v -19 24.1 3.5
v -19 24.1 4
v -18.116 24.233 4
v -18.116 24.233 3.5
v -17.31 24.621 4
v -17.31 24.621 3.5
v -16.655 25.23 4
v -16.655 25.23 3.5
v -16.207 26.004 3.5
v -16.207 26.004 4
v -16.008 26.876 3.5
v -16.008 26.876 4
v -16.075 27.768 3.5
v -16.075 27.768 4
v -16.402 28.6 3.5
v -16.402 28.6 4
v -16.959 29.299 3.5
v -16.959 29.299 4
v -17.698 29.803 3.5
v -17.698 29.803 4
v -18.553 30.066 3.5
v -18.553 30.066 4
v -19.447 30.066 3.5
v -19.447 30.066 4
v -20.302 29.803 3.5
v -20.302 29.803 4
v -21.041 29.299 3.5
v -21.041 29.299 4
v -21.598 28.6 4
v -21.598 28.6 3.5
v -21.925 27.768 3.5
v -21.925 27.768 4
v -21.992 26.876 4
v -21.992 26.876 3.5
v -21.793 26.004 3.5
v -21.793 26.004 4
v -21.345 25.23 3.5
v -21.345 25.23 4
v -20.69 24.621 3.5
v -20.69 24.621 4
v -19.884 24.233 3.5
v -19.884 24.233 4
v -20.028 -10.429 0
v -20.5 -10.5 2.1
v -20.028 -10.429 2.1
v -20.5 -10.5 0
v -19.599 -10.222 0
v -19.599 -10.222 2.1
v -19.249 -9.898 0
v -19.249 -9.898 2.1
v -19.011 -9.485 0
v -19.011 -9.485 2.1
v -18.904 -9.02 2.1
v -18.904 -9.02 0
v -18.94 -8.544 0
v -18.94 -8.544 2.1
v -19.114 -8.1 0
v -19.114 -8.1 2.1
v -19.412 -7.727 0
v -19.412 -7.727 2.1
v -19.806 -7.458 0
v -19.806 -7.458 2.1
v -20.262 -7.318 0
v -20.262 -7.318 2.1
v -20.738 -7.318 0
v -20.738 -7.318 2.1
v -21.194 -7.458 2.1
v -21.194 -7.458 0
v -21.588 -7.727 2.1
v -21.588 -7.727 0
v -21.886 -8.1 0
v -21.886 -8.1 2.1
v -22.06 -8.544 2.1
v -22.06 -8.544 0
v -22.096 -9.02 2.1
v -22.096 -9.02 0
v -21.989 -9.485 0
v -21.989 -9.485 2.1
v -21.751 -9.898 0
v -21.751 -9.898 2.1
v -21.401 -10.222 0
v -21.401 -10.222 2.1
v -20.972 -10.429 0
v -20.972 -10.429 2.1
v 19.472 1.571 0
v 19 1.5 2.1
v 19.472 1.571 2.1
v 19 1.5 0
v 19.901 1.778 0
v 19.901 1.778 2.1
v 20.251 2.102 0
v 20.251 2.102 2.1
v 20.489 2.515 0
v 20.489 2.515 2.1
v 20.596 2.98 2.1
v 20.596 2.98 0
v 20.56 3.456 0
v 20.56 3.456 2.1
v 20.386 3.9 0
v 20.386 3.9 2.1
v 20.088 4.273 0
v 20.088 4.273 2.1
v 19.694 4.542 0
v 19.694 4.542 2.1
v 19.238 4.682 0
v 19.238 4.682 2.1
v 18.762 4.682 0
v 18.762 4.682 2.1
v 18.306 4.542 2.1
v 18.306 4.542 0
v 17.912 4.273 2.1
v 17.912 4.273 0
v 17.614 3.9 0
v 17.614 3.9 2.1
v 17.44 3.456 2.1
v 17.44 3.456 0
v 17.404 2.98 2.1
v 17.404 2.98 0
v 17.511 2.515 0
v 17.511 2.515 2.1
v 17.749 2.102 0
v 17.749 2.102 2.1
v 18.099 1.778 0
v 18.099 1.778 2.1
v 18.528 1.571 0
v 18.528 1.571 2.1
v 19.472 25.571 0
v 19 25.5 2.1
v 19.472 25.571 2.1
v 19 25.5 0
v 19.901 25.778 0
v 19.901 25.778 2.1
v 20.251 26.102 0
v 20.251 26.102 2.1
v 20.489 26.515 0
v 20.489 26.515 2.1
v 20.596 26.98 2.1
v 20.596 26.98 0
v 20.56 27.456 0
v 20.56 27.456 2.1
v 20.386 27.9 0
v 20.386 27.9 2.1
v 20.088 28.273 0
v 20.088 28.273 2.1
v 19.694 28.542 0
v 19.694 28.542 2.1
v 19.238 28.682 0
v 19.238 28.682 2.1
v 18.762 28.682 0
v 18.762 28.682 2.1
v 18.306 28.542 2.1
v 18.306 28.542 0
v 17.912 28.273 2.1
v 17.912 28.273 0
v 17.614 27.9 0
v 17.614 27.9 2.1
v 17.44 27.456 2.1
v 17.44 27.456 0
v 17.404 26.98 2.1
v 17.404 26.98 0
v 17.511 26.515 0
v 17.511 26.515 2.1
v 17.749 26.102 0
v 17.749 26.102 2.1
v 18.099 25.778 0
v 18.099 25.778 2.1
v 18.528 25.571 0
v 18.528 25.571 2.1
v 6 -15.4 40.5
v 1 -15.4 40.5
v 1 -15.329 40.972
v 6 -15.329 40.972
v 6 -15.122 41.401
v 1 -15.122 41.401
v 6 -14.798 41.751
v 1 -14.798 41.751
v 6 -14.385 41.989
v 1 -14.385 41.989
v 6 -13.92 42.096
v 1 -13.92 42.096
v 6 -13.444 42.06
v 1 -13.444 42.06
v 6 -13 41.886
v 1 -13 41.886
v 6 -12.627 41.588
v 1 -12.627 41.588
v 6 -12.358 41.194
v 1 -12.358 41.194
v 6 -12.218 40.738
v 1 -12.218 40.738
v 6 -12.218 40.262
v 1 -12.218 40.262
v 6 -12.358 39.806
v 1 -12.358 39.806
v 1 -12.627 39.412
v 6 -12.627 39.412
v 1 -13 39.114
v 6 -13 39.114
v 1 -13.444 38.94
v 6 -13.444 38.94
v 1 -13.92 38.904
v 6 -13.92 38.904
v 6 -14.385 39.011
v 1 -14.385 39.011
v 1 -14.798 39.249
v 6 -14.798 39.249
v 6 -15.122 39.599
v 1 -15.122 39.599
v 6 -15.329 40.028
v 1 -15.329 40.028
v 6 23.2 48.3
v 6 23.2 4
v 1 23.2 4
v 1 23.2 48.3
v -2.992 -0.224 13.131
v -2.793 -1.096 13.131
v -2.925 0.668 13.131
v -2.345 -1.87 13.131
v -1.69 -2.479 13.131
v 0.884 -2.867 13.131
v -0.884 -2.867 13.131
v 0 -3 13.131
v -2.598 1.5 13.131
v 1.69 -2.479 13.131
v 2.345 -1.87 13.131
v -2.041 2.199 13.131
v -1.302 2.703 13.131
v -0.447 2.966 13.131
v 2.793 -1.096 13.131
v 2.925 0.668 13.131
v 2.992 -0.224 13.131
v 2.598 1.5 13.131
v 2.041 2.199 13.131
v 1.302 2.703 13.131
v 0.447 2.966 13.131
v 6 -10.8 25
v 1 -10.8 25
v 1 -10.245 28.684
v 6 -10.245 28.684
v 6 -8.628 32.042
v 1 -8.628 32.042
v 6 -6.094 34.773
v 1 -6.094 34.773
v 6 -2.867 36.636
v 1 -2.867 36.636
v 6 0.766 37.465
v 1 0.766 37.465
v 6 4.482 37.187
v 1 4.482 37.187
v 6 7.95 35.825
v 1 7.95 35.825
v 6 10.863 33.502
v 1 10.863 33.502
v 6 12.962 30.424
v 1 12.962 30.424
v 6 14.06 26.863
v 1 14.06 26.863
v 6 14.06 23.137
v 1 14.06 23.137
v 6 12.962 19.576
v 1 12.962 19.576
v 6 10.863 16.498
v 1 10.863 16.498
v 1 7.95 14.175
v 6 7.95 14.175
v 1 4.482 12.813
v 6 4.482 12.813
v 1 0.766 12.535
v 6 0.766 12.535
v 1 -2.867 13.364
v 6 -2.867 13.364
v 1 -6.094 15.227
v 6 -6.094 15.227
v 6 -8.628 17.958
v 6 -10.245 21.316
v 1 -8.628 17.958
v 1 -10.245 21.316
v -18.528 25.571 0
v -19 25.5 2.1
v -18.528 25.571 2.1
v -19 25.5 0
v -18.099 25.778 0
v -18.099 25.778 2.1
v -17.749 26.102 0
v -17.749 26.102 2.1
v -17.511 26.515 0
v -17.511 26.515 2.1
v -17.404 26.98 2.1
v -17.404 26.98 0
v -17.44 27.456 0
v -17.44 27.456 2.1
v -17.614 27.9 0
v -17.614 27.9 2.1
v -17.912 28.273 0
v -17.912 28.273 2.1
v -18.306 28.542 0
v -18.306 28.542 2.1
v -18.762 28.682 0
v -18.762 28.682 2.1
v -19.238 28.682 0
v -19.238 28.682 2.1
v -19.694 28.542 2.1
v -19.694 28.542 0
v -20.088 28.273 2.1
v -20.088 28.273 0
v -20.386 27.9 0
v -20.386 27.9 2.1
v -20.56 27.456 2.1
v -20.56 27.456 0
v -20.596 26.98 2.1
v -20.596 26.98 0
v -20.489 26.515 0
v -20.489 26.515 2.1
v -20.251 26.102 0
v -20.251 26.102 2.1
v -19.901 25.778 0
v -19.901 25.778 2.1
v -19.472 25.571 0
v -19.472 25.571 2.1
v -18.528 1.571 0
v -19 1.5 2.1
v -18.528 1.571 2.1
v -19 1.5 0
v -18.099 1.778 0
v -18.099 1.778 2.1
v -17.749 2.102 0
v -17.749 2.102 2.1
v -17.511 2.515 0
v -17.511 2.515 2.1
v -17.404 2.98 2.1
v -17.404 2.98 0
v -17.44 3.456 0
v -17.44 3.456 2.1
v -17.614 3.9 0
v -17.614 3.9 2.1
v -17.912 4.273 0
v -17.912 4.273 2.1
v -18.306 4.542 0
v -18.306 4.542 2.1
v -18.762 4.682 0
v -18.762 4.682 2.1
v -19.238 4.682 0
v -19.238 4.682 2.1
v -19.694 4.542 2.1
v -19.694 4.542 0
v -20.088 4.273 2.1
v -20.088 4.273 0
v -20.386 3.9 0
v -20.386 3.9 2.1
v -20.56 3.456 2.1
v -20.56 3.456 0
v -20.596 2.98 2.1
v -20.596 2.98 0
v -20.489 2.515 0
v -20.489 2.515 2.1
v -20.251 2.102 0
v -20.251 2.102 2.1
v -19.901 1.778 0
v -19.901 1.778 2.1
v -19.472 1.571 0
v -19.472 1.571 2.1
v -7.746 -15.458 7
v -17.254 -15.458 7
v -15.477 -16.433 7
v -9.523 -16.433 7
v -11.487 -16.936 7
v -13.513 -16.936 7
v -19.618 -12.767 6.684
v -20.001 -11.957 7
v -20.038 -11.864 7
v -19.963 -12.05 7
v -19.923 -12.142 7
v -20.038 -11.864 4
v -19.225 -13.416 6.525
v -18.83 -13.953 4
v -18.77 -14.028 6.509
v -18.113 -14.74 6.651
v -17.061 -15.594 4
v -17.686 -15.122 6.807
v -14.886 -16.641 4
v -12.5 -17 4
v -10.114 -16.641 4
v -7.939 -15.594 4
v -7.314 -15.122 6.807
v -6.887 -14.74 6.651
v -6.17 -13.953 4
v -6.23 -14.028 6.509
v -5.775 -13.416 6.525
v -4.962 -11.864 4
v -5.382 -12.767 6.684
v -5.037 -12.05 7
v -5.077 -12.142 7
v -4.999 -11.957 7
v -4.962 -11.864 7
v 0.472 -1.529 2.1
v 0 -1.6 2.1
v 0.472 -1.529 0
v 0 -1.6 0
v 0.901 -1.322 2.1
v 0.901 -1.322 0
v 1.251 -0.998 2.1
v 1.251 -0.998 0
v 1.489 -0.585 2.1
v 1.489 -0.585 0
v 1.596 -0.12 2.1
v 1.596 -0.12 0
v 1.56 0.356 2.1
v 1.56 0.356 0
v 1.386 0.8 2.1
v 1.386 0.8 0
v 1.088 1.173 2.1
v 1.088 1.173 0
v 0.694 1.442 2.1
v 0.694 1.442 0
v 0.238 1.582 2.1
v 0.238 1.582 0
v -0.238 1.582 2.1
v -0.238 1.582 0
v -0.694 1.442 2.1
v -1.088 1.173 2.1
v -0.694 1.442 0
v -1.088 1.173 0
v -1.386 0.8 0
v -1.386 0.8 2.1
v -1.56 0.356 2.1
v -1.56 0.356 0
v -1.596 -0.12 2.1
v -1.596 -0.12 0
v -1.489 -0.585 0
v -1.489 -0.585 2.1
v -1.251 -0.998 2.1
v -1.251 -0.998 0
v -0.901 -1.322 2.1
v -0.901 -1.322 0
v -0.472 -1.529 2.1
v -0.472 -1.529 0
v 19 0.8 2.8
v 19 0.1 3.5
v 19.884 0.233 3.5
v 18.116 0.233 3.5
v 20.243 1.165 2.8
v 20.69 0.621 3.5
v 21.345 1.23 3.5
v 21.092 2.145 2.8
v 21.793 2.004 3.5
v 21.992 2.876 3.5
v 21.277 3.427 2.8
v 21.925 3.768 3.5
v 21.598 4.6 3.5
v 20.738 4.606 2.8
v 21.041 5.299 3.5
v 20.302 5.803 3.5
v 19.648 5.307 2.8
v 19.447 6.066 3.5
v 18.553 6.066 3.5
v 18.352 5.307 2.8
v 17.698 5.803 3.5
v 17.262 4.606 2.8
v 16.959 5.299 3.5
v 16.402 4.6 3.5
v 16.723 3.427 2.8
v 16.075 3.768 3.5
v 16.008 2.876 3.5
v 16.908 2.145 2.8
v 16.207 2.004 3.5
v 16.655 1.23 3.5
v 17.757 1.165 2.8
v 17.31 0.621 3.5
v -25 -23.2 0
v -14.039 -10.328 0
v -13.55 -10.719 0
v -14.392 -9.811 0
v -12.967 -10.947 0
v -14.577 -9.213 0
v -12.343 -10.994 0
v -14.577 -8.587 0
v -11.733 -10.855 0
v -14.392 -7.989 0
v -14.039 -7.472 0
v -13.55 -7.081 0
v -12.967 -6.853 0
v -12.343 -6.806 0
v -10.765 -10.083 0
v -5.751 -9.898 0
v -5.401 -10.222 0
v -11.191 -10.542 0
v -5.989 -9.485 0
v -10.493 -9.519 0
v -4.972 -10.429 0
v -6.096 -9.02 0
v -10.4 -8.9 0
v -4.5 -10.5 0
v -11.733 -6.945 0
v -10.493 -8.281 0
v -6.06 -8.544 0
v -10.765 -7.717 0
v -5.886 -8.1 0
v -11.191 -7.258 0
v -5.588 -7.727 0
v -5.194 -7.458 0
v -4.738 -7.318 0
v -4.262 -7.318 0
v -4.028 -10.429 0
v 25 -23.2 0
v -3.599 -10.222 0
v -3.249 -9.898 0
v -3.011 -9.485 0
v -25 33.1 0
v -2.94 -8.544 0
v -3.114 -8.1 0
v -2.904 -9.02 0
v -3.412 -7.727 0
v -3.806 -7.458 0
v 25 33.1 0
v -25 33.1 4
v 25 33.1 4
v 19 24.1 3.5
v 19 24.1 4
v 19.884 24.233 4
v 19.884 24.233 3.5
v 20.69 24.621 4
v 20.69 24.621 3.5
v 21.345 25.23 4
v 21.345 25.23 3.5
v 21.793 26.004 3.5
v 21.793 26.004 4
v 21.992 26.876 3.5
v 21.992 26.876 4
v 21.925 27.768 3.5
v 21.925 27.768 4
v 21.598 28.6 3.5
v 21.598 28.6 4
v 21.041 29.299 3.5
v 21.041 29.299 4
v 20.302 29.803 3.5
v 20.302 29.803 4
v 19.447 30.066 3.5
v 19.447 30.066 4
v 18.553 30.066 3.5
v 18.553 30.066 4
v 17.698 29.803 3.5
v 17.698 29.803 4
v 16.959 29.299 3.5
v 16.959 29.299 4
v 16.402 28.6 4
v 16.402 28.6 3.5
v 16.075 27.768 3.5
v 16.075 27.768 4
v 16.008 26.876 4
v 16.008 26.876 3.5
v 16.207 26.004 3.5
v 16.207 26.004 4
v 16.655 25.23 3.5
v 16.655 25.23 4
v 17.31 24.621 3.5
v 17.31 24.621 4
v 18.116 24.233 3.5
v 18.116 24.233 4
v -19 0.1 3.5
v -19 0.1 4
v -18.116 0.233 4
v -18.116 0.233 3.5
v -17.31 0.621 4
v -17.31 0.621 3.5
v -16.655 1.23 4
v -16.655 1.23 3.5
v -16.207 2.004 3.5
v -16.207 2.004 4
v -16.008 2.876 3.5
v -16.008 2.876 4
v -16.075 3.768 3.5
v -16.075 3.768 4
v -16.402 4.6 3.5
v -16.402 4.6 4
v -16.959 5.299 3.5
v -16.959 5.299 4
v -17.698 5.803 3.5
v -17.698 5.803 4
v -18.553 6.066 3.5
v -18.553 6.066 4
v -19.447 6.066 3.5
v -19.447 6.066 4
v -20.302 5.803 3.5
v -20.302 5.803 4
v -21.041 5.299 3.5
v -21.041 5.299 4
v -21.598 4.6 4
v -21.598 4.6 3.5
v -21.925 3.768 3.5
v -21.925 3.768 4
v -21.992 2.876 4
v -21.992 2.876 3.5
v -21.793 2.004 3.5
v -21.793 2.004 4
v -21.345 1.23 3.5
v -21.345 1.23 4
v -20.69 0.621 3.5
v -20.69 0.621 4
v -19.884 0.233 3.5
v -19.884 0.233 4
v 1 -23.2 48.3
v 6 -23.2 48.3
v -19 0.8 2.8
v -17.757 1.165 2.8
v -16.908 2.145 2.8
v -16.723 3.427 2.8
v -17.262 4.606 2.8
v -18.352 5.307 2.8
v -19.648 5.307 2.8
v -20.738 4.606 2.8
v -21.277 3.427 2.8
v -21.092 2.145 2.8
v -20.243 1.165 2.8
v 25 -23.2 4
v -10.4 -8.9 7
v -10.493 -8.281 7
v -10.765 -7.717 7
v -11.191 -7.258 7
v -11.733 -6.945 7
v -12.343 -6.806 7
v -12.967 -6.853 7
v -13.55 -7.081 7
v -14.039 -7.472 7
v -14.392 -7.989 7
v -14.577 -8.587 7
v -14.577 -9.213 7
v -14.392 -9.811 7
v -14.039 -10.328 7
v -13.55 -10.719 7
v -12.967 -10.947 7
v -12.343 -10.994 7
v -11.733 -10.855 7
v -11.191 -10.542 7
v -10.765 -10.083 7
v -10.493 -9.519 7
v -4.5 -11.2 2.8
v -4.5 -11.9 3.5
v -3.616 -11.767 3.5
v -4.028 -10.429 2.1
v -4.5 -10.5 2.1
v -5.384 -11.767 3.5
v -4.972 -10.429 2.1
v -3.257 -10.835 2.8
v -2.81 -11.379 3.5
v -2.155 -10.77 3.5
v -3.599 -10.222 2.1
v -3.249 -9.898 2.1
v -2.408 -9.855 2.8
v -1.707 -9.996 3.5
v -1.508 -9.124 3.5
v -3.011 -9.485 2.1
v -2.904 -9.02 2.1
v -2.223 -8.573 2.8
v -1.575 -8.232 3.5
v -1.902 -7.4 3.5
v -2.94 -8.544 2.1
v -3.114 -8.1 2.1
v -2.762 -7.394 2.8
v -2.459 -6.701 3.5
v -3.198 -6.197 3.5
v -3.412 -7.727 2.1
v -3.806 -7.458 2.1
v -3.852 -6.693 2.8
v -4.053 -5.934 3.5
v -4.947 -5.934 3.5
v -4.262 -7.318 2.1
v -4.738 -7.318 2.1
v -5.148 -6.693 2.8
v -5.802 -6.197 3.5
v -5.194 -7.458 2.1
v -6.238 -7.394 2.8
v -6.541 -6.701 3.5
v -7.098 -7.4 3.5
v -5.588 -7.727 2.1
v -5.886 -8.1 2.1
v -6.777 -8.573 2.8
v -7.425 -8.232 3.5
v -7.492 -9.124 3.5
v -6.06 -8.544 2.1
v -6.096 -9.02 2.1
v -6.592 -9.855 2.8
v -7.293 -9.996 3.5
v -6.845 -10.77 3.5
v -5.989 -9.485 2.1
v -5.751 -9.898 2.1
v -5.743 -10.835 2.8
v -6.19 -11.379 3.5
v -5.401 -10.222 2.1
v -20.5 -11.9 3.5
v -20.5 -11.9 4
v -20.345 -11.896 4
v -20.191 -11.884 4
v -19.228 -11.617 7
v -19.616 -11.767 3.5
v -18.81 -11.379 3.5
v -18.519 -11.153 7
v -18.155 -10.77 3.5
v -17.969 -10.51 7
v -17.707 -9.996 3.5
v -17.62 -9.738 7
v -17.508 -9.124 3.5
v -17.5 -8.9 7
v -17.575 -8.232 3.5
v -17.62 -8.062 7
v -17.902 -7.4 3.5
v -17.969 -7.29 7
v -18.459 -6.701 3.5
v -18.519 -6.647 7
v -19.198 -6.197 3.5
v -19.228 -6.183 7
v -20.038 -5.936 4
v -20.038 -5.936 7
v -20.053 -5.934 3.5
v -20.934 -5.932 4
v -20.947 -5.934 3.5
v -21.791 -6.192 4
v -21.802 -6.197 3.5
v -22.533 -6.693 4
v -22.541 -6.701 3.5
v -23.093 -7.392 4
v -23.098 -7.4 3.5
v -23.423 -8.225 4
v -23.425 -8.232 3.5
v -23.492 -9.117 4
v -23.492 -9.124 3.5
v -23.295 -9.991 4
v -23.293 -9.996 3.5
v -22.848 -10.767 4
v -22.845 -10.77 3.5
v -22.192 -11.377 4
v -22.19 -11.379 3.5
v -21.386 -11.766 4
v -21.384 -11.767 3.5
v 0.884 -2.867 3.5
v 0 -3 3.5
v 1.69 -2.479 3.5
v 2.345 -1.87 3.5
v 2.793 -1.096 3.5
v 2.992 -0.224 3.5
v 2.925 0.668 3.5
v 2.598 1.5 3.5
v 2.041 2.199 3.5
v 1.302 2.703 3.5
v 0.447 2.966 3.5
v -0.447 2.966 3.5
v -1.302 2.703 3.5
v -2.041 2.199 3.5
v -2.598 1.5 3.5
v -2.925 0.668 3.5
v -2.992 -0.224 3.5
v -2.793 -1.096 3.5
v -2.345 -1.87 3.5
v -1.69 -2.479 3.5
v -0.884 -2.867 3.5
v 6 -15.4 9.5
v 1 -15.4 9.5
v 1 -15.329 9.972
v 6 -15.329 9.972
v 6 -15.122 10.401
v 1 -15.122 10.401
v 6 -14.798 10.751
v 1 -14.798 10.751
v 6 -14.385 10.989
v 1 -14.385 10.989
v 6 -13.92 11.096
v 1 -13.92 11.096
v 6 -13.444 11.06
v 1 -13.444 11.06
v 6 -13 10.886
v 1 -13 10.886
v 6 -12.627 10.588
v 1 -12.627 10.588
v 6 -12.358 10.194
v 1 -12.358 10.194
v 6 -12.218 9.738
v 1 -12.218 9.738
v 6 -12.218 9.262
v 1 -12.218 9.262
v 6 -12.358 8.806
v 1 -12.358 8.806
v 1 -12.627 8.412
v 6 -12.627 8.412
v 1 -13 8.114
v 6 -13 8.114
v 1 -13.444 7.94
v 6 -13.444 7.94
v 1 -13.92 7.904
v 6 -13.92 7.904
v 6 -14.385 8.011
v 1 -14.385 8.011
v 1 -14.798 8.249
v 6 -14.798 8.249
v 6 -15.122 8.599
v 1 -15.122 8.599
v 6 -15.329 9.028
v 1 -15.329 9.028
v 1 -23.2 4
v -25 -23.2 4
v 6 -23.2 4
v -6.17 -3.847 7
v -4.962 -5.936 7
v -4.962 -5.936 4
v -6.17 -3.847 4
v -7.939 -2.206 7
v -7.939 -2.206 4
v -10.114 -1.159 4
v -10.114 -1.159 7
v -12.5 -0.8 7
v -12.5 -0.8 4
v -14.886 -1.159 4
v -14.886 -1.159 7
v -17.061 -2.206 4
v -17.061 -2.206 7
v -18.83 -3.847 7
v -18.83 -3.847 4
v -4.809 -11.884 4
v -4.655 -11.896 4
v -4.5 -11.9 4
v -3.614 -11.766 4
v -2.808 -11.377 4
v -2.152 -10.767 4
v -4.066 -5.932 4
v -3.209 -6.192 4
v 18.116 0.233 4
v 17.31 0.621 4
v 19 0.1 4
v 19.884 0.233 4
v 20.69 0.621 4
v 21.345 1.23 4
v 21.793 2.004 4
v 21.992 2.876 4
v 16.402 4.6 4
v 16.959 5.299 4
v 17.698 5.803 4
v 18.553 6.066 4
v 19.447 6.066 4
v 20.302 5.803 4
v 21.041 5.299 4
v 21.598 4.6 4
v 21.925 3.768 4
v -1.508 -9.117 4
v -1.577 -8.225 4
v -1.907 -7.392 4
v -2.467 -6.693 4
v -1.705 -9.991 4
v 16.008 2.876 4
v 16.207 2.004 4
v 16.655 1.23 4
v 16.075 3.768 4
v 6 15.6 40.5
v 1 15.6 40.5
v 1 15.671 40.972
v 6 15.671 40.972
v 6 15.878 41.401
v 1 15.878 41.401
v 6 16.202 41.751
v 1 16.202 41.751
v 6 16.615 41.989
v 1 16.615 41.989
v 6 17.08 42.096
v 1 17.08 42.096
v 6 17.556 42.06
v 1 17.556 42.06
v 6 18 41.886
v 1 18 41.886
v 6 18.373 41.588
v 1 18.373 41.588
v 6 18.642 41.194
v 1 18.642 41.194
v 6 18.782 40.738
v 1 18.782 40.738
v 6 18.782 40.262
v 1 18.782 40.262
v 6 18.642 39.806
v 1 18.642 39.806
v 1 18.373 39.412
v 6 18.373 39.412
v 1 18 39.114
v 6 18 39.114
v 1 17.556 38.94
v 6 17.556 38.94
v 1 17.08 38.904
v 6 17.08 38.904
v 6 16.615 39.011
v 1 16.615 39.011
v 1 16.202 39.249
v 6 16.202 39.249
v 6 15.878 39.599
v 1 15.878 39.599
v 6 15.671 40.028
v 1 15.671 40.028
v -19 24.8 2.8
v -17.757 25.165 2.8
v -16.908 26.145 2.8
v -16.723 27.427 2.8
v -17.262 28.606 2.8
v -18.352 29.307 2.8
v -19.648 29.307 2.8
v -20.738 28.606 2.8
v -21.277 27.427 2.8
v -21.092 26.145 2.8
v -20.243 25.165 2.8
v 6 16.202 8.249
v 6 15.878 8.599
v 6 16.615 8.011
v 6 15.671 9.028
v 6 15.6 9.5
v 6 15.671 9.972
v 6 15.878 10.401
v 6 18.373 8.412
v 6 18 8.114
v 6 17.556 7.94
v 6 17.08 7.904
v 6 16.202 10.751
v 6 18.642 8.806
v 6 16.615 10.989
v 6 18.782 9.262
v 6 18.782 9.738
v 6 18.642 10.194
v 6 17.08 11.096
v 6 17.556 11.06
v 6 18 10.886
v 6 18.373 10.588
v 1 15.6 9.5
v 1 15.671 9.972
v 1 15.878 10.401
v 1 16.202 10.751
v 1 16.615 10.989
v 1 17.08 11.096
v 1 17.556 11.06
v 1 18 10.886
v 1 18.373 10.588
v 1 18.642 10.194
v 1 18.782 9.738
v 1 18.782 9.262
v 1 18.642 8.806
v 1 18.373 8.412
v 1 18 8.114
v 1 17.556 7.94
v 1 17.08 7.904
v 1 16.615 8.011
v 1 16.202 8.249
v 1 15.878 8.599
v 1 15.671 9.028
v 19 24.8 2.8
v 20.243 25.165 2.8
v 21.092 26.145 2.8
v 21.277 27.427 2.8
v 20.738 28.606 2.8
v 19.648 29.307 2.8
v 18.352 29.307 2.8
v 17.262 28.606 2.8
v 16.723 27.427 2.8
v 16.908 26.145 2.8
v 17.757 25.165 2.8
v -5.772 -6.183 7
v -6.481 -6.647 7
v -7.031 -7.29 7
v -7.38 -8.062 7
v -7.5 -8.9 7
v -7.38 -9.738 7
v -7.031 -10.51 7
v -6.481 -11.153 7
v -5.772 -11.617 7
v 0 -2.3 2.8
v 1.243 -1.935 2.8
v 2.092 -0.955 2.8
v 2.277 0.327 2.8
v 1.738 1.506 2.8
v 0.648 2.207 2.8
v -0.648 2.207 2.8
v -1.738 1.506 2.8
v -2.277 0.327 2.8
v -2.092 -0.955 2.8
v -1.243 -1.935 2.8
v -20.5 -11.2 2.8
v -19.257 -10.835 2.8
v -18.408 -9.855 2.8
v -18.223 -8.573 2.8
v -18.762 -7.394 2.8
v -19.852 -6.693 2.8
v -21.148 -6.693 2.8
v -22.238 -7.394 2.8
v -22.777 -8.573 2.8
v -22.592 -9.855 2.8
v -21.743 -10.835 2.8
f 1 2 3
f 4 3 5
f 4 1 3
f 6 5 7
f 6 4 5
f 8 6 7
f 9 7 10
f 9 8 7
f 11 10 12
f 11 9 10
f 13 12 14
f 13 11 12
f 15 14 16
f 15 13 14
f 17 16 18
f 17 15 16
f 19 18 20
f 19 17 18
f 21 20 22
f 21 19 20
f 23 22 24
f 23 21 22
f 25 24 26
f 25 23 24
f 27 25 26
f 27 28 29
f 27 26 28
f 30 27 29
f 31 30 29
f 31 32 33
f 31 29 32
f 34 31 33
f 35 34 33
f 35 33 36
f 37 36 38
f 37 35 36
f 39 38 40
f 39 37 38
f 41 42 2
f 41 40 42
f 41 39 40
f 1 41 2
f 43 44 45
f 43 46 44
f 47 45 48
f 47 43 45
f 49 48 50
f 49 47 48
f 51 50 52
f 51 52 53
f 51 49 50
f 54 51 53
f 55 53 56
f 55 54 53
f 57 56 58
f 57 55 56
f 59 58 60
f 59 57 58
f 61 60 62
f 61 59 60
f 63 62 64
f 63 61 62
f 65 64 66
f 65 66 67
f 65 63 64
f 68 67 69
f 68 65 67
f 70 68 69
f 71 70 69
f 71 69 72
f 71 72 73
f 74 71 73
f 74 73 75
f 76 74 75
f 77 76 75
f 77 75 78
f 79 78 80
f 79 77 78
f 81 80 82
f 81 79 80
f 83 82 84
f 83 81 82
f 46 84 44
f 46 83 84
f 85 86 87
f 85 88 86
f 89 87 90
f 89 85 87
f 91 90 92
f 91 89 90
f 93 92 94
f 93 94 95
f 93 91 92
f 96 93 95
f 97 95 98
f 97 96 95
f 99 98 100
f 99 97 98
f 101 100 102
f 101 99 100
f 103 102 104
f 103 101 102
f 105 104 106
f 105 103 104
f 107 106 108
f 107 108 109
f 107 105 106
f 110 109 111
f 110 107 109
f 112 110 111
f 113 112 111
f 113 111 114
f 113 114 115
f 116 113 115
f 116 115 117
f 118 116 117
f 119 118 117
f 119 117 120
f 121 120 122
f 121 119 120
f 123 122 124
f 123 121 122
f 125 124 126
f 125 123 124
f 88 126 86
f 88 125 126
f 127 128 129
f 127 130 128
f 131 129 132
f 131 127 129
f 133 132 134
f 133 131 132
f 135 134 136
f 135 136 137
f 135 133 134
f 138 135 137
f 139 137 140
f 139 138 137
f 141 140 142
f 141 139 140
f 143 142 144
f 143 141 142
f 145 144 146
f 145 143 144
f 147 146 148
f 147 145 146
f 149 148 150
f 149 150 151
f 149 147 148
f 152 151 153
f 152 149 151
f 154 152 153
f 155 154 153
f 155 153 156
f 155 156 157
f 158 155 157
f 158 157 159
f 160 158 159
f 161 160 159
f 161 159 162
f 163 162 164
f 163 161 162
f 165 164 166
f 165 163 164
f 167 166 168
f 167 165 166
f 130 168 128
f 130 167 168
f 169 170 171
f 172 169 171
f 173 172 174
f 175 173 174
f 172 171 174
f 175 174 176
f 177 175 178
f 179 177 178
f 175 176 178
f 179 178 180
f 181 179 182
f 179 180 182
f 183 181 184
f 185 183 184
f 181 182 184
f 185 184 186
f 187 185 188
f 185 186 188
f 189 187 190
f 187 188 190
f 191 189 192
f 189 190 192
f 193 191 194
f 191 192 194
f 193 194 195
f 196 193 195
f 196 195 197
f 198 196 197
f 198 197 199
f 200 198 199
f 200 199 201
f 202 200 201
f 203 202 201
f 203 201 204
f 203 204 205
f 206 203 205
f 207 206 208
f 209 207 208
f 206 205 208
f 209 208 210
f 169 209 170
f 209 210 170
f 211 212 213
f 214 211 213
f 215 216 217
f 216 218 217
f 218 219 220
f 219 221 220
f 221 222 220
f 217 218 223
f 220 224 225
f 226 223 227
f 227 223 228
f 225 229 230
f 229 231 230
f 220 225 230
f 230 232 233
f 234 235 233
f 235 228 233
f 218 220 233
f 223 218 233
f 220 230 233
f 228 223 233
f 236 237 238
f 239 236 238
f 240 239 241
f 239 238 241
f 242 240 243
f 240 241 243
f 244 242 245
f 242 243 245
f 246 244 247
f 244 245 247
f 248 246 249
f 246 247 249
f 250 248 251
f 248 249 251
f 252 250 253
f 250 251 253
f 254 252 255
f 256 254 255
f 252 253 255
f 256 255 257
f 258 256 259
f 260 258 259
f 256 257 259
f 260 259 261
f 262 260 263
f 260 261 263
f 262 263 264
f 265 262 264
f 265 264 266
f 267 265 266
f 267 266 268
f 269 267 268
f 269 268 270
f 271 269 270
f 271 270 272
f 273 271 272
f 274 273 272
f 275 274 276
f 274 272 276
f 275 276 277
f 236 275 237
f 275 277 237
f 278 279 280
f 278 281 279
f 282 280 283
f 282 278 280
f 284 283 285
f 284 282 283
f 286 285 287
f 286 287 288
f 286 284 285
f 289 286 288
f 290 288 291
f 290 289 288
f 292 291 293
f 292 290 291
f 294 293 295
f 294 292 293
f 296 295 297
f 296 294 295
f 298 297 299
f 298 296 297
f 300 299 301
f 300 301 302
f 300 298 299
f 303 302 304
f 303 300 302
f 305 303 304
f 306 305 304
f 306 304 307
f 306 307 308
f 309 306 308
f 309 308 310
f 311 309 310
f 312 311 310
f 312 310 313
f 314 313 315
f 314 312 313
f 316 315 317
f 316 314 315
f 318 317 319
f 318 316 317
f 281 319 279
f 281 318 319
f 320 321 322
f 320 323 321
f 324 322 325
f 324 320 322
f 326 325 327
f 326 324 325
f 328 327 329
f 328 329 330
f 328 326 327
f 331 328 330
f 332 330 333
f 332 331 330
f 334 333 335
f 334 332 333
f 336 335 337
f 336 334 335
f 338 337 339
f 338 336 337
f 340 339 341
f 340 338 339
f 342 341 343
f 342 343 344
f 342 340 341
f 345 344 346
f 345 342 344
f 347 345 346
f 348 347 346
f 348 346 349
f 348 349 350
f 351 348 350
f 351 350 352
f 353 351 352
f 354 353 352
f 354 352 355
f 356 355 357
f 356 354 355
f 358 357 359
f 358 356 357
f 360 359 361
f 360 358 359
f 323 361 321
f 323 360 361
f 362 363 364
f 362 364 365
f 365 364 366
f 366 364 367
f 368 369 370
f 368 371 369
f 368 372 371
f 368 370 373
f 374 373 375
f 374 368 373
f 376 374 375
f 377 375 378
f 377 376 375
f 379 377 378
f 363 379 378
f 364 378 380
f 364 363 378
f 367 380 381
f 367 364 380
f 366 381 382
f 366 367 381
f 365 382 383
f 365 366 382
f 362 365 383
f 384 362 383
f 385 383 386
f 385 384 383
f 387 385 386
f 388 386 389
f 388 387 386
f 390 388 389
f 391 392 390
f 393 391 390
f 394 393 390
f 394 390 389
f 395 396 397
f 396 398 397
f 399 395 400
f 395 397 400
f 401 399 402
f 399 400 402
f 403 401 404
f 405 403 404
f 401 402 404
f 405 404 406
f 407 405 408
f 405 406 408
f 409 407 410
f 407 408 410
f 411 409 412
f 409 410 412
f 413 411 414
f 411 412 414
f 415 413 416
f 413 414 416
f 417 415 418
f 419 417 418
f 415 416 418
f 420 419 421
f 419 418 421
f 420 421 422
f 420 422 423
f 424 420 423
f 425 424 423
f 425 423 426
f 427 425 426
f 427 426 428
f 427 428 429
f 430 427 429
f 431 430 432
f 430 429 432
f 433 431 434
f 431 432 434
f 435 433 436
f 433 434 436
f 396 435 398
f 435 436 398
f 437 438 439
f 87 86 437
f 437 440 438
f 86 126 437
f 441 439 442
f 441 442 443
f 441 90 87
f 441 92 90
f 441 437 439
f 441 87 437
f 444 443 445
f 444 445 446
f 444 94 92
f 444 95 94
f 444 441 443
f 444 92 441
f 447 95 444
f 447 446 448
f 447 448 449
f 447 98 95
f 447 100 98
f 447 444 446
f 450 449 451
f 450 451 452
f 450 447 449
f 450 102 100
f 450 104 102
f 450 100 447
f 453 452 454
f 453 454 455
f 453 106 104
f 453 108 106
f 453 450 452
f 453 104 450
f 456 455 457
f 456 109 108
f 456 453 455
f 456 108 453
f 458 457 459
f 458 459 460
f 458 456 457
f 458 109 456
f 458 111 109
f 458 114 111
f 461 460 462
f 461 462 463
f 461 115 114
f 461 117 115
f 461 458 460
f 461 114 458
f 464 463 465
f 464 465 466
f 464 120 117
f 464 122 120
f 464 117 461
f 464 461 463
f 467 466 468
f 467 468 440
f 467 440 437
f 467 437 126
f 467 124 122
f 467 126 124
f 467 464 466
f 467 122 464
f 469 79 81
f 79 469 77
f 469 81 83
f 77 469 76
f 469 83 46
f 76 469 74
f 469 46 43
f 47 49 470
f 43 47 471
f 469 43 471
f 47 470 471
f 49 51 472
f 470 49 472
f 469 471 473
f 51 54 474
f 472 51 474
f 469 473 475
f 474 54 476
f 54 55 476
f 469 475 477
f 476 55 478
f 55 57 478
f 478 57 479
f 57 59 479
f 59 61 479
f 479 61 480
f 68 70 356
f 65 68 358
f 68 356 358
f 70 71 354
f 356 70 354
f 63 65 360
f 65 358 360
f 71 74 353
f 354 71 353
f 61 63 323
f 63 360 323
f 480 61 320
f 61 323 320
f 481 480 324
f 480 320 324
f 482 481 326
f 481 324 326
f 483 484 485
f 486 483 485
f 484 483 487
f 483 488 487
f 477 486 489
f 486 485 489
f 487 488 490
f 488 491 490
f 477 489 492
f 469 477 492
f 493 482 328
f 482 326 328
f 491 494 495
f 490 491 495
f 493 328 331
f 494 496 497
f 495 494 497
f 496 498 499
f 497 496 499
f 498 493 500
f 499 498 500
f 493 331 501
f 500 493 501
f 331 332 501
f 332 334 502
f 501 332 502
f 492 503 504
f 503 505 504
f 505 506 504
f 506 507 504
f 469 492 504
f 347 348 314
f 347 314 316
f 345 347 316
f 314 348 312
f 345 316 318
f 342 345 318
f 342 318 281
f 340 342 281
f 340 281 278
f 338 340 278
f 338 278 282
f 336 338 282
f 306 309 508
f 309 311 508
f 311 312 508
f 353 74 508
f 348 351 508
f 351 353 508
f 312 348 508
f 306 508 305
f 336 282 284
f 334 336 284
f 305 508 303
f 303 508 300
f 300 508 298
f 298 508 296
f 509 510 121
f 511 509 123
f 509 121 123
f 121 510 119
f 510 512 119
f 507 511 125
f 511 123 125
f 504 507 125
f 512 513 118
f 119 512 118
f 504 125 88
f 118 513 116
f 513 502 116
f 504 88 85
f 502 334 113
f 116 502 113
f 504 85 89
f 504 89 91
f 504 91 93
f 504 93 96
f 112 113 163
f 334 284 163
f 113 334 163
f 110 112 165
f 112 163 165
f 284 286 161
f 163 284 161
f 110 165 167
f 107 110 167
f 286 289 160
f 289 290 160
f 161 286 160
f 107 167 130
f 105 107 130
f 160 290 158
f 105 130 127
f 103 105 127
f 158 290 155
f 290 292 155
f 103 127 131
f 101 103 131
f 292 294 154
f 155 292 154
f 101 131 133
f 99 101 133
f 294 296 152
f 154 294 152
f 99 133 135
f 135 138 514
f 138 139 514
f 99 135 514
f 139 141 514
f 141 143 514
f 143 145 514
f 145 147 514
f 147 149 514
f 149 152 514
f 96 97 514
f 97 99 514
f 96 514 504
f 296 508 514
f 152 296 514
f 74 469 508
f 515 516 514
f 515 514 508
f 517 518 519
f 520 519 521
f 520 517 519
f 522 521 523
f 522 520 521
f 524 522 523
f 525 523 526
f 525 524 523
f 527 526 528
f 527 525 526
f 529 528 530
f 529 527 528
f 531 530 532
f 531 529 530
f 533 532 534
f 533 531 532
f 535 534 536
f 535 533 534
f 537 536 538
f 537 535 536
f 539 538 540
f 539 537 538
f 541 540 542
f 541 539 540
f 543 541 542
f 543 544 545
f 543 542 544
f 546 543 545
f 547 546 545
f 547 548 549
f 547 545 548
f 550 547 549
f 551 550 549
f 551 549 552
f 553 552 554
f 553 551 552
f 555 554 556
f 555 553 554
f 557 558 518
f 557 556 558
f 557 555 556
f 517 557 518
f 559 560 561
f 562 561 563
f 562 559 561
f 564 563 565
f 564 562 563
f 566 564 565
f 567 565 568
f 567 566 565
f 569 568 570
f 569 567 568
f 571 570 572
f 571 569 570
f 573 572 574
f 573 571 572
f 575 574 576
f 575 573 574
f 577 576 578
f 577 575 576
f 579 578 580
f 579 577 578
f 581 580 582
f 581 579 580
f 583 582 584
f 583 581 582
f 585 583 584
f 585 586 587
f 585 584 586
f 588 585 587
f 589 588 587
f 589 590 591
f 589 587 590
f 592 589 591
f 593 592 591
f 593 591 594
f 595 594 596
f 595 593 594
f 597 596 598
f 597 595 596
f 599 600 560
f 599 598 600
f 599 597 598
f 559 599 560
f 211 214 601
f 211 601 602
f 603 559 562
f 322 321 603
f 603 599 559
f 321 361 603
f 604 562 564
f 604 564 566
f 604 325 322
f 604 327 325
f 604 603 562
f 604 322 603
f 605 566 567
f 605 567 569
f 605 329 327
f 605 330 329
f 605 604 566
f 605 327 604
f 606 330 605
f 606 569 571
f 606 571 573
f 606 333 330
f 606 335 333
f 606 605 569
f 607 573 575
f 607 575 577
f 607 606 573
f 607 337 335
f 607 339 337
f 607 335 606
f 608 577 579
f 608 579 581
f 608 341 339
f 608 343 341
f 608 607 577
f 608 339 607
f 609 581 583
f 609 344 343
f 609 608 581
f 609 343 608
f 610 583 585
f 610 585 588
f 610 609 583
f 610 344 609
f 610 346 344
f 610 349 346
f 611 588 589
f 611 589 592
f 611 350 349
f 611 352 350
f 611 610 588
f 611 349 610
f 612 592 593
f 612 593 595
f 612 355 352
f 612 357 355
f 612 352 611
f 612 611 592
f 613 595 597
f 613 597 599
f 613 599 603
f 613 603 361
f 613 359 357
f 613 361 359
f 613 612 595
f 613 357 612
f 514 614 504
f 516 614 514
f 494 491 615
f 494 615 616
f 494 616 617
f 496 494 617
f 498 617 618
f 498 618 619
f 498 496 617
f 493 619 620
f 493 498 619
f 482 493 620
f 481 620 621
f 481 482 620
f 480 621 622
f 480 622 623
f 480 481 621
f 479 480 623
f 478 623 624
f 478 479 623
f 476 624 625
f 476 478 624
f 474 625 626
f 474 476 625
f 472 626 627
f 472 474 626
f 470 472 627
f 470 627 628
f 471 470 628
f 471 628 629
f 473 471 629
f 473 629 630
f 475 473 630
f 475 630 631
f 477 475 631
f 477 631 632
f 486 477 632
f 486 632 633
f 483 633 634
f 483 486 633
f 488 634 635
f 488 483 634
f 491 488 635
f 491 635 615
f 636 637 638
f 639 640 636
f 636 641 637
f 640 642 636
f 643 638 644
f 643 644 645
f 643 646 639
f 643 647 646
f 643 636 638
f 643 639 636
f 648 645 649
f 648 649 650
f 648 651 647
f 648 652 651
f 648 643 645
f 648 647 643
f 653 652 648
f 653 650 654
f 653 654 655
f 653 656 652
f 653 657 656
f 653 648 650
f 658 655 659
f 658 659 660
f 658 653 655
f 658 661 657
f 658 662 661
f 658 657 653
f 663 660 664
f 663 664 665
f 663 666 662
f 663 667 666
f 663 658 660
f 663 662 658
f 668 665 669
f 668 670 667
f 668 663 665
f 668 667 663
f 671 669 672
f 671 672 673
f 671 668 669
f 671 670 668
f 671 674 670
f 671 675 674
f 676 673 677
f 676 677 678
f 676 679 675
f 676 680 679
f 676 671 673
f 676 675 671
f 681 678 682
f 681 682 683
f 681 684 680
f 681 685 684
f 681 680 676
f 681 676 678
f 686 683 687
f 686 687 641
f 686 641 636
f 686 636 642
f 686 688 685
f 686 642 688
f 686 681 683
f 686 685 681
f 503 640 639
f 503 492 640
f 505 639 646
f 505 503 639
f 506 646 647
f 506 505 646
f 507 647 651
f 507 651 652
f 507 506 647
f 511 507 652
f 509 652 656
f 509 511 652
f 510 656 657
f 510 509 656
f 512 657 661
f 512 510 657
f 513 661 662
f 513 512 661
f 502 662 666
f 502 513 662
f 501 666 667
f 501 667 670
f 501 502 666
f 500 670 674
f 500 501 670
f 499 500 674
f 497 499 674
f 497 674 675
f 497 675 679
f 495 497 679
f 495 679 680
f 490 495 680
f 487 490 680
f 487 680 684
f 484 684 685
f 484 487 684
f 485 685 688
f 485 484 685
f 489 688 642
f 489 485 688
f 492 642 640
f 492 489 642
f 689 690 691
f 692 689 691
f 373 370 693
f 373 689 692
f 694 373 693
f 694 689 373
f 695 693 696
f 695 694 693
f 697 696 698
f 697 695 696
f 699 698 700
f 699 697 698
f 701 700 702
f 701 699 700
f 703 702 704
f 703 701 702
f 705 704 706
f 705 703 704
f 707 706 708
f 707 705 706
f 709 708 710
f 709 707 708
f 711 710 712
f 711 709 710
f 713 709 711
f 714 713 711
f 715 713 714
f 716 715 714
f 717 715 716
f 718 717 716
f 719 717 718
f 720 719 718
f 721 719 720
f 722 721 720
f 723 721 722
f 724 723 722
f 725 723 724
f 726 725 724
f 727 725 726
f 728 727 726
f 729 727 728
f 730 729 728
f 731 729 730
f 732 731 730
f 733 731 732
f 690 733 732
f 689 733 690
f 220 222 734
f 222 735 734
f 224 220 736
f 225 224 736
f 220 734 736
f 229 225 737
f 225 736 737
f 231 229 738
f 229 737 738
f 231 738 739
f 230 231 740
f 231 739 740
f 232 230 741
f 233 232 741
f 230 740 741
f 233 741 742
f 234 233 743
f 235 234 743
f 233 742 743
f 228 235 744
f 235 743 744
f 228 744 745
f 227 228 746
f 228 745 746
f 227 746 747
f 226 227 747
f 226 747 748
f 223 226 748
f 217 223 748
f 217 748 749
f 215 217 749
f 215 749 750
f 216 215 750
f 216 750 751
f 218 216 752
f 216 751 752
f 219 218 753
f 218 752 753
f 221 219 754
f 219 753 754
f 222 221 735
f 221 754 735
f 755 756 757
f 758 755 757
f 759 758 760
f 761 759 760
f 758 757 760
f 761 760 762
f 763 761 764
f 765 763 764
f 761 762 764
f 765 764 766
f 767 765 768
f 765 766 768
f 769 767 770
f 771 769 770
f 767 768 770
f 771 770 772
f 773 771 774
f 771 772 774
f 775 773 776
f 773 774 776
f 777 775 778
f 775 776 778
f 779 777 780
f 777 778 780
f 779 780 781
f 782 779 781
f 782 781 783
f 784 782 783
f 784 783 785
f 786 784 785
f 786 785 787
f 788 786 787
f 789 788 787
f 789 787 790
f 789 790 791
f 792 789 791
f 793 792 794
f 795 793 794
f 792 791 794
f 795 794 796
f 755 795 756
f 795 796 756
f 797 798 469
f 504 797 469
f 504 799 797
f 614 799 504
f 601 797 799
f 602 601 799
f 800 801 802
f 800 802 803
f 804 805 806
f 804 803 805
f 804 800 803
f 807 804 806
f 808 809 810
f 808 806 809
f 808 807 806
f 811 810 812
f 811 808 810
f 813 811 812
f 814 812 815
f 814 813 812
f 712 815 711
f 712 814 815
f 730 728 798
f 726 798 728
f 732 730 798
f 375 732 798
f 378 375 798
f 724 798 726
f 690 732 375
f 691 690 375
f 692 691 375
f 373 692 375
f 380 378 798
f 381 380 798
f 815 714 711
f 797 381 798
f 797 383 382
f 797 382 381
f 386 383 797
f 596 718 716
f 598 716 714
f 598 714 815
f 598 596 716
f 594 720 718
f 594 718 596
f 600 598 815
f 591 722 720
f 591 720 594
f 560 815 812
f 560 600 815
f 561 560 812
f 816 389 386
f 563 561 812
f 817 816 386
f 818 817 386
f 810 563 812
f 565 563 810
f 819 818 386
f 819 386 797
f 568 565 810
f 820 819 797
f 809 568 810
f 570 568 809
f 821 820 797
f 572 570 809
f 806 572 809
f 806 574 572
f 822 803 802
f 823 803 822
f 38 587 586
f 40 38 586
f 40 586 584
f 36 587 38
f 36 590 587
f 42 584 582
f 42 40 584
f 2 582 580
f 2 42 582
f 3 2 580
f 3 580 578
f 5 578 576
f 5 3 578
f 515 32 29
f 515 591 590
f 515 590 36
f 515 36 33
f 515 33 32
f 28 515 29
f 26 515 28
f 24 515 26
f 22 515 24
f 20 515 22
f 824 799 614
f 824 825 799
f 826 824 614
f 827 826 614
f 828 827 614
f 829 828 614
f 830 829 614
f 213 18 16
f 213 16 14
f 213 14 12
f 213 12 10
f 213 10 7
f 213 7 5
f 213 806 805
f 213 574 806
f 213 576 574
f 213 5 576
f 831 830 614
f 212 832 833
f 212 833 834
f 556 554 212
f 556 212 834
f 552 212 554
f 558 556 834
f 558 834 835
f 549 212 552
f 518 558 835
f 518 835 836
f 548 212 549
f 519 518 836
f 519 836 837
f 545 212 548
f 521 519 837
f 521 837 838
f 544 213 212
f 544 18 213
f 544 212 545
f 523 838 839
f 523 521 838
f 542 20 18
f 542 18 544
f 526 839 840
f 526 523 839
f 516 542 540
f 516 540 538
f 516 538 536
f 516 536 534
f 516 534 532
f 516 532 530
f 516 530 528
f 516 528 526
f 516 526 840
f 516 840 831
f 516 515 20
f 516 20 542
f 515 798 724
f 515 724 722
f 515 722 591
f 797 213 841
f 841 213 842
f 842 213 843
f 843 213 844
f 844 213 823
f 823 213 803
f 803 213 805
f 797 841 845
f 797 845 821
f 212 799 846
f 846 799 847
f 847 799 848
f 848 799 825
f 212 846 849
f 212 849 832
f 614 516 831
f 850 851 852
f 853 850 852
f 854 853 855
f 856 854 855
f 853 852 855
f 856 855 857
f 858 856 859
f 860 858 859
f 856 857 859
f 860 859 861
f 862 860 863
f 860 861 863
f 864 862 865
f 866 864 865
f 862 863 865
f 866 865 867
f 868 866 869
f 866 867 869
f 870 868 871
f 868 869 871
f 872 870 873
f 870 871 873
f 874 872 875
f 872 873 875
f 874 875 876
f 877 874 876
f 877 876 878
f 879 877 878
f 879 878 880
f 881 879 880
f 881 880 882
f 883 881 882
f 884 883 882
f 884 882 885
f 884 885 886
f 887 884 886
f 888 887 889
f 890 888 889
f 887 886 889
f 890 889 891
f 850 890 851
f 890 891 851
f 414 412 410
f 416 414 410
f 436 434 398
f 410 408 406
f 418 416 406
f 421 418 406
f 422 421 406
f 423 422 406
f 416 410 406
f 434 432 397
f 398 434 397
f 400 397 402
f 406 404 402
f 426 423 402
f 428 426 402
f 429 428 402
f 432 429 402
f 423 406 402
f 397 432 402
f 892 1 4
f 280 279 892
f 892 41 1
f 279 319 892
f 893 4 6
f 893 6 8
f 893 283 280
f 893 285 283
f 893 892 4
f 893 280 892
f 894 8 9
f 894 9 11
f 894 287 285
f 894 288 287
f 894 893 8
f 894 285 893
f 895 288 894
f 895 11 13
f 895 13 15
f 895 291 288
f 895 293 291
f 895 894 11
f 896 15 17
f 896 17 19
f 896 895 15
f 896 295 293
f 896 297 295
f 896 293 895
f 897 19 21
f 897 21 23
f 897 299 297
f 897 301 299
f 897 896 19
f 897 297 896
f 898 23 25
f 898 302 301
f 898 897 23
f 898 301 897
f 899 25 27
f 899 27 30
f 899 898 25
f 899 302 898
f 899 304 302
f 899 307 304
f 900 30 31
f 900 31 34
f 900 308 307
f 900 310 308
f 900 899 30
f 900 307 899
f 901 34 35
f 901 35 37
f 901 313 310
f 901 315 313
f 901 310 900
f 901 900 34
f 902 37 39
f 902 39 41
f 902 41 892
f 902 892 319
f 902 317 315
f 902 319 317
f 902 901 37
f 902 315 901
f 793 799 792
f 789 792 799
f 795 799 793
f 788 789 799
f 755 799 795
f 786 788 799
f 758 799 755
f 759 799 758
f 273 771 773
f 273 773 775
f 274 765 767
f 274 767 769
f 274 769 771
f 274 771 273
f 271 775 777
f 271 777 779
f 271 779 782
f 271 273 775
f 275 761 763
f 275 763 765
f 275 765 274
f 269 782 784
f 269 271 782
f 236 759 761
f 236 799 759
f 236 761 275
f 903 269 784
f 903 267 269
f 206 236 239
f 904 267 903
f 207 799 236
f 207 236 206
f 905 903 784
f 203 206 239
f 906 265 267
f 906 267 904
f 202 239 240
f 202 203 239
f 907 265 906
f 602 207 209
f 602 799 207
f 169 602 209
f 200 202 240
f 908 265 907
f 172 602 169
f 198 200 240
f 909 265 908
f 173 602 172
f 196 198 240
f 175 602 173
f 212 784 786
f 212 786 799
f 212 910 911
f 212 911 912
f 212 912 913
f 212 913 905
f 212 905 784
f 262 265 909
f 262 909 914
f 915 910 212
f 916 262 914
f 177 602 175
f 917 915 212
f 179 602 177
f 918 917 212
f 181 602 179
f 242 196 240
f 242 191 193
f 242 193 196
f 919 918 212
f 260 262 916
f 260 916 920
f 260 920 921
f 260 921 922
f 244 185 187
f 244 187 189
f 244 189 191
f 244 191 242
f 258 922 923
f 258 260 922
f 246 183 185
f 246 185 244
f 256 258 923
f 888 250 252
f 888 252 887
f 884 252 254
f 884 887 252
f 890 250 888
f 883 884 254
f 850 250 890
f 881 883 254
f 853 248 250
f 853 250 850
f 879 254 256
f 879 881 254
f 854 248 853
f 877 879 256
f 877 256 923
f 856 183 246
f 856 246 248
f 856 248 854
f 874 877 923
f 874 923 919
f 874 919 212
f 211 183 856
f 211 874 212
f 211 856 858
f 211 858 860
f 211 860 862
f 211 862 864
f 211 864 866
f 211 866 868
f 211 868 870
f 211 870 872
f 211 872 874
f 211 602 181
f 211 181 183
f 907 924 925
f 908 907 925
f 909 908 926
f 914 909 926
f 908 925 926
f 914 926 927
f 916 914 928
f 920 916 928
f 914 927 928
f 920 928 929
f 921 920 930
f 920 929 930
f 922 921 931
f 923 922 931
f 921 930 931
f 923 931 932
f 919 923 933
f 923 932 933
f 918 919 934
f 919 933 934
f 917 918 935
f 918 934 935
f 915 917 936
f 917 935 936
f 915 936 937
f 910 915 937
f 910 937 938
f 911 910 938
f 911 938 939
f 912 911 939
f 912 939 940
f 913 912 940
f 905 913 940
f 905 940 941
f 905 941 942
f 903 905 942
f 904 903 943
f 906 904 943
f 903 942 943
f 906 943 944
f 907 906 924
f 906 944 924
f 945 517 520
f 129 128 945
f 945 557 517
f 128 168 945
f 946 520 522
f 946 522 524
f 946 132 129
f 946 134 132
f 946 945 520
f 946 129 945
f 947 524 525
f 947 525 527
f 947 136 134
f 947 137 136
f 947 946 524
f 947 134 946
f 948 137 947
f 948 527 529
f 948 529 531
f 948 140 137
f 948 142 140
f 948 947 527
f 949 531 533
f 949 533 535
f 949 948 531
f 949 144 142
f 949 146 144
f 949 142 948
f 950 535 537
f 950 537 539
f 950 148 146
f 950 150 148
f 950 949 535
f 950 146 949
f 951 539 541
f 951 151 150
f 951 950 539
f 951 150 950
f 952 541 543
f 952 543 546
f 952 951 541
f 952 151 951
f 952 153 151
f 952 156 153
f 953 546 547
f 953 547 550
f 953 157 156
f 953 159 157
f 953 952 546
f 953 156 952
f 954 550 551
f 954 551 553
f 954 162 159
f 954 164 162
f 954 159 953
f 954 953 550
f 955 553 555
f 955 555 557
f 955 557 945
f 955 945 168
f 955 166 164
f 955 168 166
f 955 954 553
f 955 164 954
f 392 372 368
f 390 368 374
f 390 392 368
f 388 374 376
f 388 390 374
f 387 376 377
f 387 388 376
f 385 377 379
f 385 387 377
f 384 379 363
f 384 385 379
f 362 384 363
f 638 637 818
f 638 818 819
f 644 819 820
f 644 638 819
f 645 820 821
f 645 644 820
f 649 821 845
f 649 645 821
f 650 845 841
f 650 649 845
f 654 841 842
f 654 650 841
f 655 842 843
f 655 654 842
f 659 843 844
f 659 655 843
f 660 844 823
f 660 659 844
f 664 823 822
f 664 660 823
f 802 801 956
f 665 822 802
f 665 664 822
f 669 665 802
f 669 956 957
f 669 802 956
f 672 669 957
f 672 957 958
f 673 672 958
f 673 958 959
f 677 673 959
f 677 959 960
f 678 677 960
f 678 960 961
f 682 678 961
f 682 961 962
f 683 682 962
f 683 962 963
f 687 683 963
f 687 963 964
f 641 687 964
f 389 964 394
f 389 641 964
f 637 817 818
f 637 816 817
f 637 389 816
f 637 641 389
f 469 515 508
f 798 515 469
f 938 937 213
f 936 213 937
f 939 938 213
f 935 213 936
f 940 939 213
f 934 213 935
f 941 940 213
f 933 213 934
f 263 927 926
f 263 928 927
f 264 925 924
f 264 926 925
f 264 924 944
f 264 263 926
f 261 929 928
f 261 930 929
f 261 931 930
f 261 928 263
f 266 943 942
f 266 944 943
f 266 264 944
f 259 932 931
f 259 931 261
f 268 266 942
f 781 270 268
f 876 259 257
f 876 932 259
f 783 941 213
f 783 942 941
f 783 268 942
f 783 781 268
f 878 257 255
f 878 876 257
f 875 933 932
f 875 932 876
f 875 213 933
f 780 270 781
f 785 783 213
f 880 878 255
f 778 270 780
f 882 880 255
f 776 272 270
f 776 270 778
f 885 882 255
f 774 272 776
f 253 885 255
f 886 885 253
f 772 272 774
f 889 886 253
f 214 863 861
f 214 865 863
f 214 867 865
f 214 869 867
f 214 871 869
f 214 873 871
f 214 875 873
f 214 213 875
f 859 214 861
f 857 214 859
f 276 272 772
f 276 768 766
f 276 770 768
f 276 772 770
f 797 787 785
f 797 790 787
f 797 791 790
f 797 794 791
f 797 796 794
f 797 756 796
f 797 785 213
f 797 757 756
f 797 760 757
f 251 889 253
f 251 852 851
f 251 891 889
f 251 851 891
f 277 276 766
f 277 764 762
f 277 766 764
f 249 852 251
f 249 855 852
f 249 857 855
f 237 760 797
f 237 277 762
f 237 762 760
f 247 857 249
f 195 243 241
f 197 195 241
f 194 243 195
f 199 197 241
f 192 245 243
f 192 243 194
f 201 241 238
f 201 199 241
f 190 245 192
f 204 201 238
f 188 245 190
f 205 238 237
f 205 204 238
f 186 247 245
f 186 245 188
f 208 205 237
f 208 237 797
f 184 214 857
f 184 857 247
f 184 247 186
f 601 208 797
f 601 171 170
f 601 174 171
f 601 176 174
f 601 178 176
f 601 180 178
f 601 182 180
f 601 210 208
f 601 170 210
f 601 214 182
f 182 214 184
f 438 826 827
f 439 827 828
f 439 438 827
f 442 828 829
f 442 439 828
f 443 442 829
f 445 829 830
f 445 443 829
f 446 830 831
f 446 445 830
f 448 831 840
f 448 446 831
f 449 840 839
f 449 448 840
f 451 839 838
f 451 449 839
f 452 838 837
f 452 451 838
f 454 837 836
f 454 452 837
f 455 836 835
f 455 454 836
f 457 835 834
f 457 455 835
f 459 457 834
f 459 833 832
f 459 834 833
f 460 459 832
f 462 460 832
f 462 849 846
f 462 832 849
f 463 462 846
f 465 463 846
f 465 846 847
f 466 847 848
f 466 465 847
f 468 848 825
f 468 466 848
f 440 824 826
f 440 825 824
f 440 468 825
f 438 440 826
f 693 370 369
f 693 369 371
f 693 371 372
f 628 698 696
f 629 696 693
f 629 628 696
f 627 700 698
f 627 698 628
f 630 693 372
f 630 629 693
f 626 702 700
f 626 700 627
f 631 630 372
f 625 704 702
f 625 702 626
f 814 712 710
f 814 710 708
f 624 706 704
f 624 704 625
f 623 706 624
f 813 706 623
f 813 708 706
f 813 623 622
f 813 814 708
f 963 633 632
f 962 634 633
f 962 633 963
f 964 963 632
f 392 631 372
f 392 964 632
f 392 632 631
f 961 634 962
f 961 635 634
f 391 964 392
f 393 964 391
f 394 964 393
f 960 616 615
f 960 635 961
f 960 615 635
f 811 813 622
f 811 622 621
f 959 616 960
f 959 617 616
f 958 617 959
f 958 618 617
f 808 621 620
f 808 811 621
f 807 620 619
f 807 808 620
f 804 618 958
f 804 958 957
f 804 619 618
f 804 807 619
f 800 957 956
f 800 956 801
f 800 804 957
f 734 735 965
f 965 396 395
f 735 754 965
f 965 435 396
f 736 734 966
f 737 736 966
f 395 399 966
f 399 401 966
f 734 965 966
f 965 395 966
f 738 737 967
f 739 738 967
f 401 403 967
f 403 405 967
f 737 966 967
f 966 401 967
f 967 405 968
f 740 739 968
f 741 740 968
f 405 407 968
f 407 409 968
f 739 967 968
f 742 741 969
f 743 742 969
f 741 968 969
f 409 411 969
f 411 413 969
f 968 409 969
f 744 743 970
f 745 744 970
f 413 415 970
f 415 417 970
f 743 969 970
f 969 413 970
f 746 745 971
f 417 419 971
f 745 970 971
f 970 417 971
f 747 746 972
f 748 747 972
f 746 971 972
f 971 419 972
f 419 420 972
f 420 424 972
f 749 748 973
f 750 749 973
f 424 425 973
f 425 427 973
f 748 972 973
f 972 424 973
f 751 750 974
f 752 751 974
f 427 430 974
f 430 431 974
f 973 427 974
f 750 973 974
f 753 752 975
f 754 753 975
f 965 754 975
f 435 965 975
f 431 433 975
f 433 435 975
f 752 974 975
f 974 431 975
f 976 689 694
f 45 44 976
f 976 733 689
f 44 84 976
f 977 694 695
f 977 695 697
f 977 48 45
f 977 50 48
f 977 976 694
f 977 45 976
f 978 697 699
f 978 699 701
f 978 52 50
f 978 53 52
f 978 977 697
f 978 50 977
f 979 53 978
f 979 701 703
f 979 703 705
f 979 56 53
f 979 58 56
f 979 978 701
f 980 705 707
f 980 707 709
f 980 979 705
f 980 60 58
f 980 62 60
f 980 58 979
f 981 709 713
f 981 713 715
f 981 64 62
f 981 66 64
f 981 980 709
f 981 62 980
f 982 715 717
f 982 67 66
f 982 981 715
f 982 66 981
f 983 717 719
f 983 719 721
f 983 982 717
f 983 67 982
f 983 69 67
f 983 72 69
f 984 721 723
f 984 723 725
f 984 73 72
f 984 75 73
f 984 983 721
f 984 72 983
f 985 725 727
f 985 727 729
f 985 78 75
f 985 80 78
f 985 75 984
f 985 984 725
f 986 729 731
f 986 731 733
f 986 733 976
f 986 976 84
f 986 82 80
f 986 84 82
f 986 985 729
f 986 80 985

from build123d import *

# Parameters (mm, degrees)
F4_W      = 5
F4_H      = 46.4
F6_R      = 8.1
F8_R      = 12.5
F8_R_2    = 1.6
F9_DEPTH  = 5
F10_R     = 2.1
F11_DEPTH = 7
F12_R     = 3
F13_DEPTH = 26


with BuildPart() as f3:
    # F3: sweep along a path in F1
    with BuildLine(Plane.XZ) as f3_path:
        Line((0, 0), (0, 4))
    # F2 (on Top) → F3 (sweep)
    with BuildSketch(Plane.XY):
        Polygon((-25, 33.1), (-25, 23.2), (-25, -23.2), (25, -23.2), (25, 23.2), (25, 33.1), align=None)
    sweep(path=f3_path.line)

    # F5: sweep along a path in F1
    with BuildLine(Plane.XZ) as f5_path:
        Line((0, 0), (0, 4))
        Line((0, 4), (0, 7))
        Line((0, 7), (0, 48.3))
    # F4 (on Top) → F5 (sweep)
    with BuildSketch(Plane.XY):
        with Locations((3.5, 0)):
            Rectangle(F4_W, F4_H)
    sweep(path=f5_path.line)

    # F7: sweep along a path in F1
    with BuildLine(Plane.XZ) as f7_path:
        Line((0, 0), (0, 4))
        Line((0, 4), (0, 7))
    # F6 (on Top) → F7 (sweep)
    with BuildSketch(Plane.XY):
        with Locations((-12.5, -8.9)):
            Circle(F6_R)
    sweep(path=f7_path.line)

    # F8 (on face) → F9 (cut, through all)
    with BuildSketch(Plane(origin=(1, 0, 0), x_dir=(0, -1, 0), z_dir=(-1, 0, 0))):
        with Locations((-1.7, 25)):
            Circle(F8_R)
        with Locations((-17.2, 40.5)):
            Circle(F8_R_2)
        with Locations((13.8, 40.5)):
            Circle(F8_R_2)
        with Locations((13.8, 9.5)):
            Circle(F8_R_2)
        with Locations((-17.2, 9.5)):
            Circle(F8_R_2)
    extrude(amount=-F9_DEPTH, mode=Mode.SUBTRACT)

    # F10 (on Top) → F11 (cut, through all)
    with BuildSketch(Plane.XY):
        with Locations((-12.5, -8.9)):
            Circle(F10_R)
    extrude(amount=F11_DEPTH, mode=Mode.SUBTRACT)

    # F12 (on face) → F13 (cut, through all)
    with BuildSketch(Plane(origin=(1, 0, 0), x_dir=(0, -1, 0), z_dir=(-1, 0, 0))):
        with Locations((13.8, 9.5)):
            Circle(F12_R)
    extrude(amount=F13_DEPTH, mode=Mode.SUBTRACT)


with BuildPart() as f15:
    # F14 (on Right) → F15 (revolve)
    with BuildSketch(Plane.YZ):
        Polygon((-1.6, 0), (0, 0), (0, 4), (0, 13.1310271099), (-3, 13.1310271099), (-3, 4), (-3, 3.5), (-1.6, 2.1), align=None)
    revolve(axis=Axis((0, 0, 2), (0, 0, 1)))


with BuildPart() as f16_1:
    # F16: copy of F15
    add(f15.part.moved(Location((-20.5, -8.9, 0))))


with BuildPart() as f17_1:
    # F17: copy of F15
    add(f15.part.moved(Location((-4.5, -8.9, 0))))


with BuildPart() as f18_1:
    # F18: copy of F15
    add(f15.part.moved(Location((-19, 3.1, 0))))


with BuildPart() as f19_1:
    # F19: copy of F15
    add(f15.part.moved(Location((-19, 27.1, 0))))


with BuildPart() as f20_1:
    # F20: copy of F15
    add(f15.part.moved(Location((19, 27.1, 0))))


with BuildPart() as f21_1:
    # F21: copy of F15
    add(f15.part.moved(Location((19, 3.1, 0))))


with BuildPart() as f3_1:
    add(f3.part)

    # F22: cut F16_1, F17_1, F19_1, F18_1, F21_1, F20_1
    add(f16_1.part, mode=Mode.SUBTRACT)
    add(f17_1.part, mode=Mode.SUBTRACT)
    add(f19_1.part, mode=Mode.SUBTRACT)
    add(f18_1.part, mode=Mode.SUBTRACT)
    add(f21_1.part, mode=Mode.SUBTRACT)
    add(f20_1.part, mode=Mode.SUBTRACT)


solid = Compound([f15.part, f3_1.part])
